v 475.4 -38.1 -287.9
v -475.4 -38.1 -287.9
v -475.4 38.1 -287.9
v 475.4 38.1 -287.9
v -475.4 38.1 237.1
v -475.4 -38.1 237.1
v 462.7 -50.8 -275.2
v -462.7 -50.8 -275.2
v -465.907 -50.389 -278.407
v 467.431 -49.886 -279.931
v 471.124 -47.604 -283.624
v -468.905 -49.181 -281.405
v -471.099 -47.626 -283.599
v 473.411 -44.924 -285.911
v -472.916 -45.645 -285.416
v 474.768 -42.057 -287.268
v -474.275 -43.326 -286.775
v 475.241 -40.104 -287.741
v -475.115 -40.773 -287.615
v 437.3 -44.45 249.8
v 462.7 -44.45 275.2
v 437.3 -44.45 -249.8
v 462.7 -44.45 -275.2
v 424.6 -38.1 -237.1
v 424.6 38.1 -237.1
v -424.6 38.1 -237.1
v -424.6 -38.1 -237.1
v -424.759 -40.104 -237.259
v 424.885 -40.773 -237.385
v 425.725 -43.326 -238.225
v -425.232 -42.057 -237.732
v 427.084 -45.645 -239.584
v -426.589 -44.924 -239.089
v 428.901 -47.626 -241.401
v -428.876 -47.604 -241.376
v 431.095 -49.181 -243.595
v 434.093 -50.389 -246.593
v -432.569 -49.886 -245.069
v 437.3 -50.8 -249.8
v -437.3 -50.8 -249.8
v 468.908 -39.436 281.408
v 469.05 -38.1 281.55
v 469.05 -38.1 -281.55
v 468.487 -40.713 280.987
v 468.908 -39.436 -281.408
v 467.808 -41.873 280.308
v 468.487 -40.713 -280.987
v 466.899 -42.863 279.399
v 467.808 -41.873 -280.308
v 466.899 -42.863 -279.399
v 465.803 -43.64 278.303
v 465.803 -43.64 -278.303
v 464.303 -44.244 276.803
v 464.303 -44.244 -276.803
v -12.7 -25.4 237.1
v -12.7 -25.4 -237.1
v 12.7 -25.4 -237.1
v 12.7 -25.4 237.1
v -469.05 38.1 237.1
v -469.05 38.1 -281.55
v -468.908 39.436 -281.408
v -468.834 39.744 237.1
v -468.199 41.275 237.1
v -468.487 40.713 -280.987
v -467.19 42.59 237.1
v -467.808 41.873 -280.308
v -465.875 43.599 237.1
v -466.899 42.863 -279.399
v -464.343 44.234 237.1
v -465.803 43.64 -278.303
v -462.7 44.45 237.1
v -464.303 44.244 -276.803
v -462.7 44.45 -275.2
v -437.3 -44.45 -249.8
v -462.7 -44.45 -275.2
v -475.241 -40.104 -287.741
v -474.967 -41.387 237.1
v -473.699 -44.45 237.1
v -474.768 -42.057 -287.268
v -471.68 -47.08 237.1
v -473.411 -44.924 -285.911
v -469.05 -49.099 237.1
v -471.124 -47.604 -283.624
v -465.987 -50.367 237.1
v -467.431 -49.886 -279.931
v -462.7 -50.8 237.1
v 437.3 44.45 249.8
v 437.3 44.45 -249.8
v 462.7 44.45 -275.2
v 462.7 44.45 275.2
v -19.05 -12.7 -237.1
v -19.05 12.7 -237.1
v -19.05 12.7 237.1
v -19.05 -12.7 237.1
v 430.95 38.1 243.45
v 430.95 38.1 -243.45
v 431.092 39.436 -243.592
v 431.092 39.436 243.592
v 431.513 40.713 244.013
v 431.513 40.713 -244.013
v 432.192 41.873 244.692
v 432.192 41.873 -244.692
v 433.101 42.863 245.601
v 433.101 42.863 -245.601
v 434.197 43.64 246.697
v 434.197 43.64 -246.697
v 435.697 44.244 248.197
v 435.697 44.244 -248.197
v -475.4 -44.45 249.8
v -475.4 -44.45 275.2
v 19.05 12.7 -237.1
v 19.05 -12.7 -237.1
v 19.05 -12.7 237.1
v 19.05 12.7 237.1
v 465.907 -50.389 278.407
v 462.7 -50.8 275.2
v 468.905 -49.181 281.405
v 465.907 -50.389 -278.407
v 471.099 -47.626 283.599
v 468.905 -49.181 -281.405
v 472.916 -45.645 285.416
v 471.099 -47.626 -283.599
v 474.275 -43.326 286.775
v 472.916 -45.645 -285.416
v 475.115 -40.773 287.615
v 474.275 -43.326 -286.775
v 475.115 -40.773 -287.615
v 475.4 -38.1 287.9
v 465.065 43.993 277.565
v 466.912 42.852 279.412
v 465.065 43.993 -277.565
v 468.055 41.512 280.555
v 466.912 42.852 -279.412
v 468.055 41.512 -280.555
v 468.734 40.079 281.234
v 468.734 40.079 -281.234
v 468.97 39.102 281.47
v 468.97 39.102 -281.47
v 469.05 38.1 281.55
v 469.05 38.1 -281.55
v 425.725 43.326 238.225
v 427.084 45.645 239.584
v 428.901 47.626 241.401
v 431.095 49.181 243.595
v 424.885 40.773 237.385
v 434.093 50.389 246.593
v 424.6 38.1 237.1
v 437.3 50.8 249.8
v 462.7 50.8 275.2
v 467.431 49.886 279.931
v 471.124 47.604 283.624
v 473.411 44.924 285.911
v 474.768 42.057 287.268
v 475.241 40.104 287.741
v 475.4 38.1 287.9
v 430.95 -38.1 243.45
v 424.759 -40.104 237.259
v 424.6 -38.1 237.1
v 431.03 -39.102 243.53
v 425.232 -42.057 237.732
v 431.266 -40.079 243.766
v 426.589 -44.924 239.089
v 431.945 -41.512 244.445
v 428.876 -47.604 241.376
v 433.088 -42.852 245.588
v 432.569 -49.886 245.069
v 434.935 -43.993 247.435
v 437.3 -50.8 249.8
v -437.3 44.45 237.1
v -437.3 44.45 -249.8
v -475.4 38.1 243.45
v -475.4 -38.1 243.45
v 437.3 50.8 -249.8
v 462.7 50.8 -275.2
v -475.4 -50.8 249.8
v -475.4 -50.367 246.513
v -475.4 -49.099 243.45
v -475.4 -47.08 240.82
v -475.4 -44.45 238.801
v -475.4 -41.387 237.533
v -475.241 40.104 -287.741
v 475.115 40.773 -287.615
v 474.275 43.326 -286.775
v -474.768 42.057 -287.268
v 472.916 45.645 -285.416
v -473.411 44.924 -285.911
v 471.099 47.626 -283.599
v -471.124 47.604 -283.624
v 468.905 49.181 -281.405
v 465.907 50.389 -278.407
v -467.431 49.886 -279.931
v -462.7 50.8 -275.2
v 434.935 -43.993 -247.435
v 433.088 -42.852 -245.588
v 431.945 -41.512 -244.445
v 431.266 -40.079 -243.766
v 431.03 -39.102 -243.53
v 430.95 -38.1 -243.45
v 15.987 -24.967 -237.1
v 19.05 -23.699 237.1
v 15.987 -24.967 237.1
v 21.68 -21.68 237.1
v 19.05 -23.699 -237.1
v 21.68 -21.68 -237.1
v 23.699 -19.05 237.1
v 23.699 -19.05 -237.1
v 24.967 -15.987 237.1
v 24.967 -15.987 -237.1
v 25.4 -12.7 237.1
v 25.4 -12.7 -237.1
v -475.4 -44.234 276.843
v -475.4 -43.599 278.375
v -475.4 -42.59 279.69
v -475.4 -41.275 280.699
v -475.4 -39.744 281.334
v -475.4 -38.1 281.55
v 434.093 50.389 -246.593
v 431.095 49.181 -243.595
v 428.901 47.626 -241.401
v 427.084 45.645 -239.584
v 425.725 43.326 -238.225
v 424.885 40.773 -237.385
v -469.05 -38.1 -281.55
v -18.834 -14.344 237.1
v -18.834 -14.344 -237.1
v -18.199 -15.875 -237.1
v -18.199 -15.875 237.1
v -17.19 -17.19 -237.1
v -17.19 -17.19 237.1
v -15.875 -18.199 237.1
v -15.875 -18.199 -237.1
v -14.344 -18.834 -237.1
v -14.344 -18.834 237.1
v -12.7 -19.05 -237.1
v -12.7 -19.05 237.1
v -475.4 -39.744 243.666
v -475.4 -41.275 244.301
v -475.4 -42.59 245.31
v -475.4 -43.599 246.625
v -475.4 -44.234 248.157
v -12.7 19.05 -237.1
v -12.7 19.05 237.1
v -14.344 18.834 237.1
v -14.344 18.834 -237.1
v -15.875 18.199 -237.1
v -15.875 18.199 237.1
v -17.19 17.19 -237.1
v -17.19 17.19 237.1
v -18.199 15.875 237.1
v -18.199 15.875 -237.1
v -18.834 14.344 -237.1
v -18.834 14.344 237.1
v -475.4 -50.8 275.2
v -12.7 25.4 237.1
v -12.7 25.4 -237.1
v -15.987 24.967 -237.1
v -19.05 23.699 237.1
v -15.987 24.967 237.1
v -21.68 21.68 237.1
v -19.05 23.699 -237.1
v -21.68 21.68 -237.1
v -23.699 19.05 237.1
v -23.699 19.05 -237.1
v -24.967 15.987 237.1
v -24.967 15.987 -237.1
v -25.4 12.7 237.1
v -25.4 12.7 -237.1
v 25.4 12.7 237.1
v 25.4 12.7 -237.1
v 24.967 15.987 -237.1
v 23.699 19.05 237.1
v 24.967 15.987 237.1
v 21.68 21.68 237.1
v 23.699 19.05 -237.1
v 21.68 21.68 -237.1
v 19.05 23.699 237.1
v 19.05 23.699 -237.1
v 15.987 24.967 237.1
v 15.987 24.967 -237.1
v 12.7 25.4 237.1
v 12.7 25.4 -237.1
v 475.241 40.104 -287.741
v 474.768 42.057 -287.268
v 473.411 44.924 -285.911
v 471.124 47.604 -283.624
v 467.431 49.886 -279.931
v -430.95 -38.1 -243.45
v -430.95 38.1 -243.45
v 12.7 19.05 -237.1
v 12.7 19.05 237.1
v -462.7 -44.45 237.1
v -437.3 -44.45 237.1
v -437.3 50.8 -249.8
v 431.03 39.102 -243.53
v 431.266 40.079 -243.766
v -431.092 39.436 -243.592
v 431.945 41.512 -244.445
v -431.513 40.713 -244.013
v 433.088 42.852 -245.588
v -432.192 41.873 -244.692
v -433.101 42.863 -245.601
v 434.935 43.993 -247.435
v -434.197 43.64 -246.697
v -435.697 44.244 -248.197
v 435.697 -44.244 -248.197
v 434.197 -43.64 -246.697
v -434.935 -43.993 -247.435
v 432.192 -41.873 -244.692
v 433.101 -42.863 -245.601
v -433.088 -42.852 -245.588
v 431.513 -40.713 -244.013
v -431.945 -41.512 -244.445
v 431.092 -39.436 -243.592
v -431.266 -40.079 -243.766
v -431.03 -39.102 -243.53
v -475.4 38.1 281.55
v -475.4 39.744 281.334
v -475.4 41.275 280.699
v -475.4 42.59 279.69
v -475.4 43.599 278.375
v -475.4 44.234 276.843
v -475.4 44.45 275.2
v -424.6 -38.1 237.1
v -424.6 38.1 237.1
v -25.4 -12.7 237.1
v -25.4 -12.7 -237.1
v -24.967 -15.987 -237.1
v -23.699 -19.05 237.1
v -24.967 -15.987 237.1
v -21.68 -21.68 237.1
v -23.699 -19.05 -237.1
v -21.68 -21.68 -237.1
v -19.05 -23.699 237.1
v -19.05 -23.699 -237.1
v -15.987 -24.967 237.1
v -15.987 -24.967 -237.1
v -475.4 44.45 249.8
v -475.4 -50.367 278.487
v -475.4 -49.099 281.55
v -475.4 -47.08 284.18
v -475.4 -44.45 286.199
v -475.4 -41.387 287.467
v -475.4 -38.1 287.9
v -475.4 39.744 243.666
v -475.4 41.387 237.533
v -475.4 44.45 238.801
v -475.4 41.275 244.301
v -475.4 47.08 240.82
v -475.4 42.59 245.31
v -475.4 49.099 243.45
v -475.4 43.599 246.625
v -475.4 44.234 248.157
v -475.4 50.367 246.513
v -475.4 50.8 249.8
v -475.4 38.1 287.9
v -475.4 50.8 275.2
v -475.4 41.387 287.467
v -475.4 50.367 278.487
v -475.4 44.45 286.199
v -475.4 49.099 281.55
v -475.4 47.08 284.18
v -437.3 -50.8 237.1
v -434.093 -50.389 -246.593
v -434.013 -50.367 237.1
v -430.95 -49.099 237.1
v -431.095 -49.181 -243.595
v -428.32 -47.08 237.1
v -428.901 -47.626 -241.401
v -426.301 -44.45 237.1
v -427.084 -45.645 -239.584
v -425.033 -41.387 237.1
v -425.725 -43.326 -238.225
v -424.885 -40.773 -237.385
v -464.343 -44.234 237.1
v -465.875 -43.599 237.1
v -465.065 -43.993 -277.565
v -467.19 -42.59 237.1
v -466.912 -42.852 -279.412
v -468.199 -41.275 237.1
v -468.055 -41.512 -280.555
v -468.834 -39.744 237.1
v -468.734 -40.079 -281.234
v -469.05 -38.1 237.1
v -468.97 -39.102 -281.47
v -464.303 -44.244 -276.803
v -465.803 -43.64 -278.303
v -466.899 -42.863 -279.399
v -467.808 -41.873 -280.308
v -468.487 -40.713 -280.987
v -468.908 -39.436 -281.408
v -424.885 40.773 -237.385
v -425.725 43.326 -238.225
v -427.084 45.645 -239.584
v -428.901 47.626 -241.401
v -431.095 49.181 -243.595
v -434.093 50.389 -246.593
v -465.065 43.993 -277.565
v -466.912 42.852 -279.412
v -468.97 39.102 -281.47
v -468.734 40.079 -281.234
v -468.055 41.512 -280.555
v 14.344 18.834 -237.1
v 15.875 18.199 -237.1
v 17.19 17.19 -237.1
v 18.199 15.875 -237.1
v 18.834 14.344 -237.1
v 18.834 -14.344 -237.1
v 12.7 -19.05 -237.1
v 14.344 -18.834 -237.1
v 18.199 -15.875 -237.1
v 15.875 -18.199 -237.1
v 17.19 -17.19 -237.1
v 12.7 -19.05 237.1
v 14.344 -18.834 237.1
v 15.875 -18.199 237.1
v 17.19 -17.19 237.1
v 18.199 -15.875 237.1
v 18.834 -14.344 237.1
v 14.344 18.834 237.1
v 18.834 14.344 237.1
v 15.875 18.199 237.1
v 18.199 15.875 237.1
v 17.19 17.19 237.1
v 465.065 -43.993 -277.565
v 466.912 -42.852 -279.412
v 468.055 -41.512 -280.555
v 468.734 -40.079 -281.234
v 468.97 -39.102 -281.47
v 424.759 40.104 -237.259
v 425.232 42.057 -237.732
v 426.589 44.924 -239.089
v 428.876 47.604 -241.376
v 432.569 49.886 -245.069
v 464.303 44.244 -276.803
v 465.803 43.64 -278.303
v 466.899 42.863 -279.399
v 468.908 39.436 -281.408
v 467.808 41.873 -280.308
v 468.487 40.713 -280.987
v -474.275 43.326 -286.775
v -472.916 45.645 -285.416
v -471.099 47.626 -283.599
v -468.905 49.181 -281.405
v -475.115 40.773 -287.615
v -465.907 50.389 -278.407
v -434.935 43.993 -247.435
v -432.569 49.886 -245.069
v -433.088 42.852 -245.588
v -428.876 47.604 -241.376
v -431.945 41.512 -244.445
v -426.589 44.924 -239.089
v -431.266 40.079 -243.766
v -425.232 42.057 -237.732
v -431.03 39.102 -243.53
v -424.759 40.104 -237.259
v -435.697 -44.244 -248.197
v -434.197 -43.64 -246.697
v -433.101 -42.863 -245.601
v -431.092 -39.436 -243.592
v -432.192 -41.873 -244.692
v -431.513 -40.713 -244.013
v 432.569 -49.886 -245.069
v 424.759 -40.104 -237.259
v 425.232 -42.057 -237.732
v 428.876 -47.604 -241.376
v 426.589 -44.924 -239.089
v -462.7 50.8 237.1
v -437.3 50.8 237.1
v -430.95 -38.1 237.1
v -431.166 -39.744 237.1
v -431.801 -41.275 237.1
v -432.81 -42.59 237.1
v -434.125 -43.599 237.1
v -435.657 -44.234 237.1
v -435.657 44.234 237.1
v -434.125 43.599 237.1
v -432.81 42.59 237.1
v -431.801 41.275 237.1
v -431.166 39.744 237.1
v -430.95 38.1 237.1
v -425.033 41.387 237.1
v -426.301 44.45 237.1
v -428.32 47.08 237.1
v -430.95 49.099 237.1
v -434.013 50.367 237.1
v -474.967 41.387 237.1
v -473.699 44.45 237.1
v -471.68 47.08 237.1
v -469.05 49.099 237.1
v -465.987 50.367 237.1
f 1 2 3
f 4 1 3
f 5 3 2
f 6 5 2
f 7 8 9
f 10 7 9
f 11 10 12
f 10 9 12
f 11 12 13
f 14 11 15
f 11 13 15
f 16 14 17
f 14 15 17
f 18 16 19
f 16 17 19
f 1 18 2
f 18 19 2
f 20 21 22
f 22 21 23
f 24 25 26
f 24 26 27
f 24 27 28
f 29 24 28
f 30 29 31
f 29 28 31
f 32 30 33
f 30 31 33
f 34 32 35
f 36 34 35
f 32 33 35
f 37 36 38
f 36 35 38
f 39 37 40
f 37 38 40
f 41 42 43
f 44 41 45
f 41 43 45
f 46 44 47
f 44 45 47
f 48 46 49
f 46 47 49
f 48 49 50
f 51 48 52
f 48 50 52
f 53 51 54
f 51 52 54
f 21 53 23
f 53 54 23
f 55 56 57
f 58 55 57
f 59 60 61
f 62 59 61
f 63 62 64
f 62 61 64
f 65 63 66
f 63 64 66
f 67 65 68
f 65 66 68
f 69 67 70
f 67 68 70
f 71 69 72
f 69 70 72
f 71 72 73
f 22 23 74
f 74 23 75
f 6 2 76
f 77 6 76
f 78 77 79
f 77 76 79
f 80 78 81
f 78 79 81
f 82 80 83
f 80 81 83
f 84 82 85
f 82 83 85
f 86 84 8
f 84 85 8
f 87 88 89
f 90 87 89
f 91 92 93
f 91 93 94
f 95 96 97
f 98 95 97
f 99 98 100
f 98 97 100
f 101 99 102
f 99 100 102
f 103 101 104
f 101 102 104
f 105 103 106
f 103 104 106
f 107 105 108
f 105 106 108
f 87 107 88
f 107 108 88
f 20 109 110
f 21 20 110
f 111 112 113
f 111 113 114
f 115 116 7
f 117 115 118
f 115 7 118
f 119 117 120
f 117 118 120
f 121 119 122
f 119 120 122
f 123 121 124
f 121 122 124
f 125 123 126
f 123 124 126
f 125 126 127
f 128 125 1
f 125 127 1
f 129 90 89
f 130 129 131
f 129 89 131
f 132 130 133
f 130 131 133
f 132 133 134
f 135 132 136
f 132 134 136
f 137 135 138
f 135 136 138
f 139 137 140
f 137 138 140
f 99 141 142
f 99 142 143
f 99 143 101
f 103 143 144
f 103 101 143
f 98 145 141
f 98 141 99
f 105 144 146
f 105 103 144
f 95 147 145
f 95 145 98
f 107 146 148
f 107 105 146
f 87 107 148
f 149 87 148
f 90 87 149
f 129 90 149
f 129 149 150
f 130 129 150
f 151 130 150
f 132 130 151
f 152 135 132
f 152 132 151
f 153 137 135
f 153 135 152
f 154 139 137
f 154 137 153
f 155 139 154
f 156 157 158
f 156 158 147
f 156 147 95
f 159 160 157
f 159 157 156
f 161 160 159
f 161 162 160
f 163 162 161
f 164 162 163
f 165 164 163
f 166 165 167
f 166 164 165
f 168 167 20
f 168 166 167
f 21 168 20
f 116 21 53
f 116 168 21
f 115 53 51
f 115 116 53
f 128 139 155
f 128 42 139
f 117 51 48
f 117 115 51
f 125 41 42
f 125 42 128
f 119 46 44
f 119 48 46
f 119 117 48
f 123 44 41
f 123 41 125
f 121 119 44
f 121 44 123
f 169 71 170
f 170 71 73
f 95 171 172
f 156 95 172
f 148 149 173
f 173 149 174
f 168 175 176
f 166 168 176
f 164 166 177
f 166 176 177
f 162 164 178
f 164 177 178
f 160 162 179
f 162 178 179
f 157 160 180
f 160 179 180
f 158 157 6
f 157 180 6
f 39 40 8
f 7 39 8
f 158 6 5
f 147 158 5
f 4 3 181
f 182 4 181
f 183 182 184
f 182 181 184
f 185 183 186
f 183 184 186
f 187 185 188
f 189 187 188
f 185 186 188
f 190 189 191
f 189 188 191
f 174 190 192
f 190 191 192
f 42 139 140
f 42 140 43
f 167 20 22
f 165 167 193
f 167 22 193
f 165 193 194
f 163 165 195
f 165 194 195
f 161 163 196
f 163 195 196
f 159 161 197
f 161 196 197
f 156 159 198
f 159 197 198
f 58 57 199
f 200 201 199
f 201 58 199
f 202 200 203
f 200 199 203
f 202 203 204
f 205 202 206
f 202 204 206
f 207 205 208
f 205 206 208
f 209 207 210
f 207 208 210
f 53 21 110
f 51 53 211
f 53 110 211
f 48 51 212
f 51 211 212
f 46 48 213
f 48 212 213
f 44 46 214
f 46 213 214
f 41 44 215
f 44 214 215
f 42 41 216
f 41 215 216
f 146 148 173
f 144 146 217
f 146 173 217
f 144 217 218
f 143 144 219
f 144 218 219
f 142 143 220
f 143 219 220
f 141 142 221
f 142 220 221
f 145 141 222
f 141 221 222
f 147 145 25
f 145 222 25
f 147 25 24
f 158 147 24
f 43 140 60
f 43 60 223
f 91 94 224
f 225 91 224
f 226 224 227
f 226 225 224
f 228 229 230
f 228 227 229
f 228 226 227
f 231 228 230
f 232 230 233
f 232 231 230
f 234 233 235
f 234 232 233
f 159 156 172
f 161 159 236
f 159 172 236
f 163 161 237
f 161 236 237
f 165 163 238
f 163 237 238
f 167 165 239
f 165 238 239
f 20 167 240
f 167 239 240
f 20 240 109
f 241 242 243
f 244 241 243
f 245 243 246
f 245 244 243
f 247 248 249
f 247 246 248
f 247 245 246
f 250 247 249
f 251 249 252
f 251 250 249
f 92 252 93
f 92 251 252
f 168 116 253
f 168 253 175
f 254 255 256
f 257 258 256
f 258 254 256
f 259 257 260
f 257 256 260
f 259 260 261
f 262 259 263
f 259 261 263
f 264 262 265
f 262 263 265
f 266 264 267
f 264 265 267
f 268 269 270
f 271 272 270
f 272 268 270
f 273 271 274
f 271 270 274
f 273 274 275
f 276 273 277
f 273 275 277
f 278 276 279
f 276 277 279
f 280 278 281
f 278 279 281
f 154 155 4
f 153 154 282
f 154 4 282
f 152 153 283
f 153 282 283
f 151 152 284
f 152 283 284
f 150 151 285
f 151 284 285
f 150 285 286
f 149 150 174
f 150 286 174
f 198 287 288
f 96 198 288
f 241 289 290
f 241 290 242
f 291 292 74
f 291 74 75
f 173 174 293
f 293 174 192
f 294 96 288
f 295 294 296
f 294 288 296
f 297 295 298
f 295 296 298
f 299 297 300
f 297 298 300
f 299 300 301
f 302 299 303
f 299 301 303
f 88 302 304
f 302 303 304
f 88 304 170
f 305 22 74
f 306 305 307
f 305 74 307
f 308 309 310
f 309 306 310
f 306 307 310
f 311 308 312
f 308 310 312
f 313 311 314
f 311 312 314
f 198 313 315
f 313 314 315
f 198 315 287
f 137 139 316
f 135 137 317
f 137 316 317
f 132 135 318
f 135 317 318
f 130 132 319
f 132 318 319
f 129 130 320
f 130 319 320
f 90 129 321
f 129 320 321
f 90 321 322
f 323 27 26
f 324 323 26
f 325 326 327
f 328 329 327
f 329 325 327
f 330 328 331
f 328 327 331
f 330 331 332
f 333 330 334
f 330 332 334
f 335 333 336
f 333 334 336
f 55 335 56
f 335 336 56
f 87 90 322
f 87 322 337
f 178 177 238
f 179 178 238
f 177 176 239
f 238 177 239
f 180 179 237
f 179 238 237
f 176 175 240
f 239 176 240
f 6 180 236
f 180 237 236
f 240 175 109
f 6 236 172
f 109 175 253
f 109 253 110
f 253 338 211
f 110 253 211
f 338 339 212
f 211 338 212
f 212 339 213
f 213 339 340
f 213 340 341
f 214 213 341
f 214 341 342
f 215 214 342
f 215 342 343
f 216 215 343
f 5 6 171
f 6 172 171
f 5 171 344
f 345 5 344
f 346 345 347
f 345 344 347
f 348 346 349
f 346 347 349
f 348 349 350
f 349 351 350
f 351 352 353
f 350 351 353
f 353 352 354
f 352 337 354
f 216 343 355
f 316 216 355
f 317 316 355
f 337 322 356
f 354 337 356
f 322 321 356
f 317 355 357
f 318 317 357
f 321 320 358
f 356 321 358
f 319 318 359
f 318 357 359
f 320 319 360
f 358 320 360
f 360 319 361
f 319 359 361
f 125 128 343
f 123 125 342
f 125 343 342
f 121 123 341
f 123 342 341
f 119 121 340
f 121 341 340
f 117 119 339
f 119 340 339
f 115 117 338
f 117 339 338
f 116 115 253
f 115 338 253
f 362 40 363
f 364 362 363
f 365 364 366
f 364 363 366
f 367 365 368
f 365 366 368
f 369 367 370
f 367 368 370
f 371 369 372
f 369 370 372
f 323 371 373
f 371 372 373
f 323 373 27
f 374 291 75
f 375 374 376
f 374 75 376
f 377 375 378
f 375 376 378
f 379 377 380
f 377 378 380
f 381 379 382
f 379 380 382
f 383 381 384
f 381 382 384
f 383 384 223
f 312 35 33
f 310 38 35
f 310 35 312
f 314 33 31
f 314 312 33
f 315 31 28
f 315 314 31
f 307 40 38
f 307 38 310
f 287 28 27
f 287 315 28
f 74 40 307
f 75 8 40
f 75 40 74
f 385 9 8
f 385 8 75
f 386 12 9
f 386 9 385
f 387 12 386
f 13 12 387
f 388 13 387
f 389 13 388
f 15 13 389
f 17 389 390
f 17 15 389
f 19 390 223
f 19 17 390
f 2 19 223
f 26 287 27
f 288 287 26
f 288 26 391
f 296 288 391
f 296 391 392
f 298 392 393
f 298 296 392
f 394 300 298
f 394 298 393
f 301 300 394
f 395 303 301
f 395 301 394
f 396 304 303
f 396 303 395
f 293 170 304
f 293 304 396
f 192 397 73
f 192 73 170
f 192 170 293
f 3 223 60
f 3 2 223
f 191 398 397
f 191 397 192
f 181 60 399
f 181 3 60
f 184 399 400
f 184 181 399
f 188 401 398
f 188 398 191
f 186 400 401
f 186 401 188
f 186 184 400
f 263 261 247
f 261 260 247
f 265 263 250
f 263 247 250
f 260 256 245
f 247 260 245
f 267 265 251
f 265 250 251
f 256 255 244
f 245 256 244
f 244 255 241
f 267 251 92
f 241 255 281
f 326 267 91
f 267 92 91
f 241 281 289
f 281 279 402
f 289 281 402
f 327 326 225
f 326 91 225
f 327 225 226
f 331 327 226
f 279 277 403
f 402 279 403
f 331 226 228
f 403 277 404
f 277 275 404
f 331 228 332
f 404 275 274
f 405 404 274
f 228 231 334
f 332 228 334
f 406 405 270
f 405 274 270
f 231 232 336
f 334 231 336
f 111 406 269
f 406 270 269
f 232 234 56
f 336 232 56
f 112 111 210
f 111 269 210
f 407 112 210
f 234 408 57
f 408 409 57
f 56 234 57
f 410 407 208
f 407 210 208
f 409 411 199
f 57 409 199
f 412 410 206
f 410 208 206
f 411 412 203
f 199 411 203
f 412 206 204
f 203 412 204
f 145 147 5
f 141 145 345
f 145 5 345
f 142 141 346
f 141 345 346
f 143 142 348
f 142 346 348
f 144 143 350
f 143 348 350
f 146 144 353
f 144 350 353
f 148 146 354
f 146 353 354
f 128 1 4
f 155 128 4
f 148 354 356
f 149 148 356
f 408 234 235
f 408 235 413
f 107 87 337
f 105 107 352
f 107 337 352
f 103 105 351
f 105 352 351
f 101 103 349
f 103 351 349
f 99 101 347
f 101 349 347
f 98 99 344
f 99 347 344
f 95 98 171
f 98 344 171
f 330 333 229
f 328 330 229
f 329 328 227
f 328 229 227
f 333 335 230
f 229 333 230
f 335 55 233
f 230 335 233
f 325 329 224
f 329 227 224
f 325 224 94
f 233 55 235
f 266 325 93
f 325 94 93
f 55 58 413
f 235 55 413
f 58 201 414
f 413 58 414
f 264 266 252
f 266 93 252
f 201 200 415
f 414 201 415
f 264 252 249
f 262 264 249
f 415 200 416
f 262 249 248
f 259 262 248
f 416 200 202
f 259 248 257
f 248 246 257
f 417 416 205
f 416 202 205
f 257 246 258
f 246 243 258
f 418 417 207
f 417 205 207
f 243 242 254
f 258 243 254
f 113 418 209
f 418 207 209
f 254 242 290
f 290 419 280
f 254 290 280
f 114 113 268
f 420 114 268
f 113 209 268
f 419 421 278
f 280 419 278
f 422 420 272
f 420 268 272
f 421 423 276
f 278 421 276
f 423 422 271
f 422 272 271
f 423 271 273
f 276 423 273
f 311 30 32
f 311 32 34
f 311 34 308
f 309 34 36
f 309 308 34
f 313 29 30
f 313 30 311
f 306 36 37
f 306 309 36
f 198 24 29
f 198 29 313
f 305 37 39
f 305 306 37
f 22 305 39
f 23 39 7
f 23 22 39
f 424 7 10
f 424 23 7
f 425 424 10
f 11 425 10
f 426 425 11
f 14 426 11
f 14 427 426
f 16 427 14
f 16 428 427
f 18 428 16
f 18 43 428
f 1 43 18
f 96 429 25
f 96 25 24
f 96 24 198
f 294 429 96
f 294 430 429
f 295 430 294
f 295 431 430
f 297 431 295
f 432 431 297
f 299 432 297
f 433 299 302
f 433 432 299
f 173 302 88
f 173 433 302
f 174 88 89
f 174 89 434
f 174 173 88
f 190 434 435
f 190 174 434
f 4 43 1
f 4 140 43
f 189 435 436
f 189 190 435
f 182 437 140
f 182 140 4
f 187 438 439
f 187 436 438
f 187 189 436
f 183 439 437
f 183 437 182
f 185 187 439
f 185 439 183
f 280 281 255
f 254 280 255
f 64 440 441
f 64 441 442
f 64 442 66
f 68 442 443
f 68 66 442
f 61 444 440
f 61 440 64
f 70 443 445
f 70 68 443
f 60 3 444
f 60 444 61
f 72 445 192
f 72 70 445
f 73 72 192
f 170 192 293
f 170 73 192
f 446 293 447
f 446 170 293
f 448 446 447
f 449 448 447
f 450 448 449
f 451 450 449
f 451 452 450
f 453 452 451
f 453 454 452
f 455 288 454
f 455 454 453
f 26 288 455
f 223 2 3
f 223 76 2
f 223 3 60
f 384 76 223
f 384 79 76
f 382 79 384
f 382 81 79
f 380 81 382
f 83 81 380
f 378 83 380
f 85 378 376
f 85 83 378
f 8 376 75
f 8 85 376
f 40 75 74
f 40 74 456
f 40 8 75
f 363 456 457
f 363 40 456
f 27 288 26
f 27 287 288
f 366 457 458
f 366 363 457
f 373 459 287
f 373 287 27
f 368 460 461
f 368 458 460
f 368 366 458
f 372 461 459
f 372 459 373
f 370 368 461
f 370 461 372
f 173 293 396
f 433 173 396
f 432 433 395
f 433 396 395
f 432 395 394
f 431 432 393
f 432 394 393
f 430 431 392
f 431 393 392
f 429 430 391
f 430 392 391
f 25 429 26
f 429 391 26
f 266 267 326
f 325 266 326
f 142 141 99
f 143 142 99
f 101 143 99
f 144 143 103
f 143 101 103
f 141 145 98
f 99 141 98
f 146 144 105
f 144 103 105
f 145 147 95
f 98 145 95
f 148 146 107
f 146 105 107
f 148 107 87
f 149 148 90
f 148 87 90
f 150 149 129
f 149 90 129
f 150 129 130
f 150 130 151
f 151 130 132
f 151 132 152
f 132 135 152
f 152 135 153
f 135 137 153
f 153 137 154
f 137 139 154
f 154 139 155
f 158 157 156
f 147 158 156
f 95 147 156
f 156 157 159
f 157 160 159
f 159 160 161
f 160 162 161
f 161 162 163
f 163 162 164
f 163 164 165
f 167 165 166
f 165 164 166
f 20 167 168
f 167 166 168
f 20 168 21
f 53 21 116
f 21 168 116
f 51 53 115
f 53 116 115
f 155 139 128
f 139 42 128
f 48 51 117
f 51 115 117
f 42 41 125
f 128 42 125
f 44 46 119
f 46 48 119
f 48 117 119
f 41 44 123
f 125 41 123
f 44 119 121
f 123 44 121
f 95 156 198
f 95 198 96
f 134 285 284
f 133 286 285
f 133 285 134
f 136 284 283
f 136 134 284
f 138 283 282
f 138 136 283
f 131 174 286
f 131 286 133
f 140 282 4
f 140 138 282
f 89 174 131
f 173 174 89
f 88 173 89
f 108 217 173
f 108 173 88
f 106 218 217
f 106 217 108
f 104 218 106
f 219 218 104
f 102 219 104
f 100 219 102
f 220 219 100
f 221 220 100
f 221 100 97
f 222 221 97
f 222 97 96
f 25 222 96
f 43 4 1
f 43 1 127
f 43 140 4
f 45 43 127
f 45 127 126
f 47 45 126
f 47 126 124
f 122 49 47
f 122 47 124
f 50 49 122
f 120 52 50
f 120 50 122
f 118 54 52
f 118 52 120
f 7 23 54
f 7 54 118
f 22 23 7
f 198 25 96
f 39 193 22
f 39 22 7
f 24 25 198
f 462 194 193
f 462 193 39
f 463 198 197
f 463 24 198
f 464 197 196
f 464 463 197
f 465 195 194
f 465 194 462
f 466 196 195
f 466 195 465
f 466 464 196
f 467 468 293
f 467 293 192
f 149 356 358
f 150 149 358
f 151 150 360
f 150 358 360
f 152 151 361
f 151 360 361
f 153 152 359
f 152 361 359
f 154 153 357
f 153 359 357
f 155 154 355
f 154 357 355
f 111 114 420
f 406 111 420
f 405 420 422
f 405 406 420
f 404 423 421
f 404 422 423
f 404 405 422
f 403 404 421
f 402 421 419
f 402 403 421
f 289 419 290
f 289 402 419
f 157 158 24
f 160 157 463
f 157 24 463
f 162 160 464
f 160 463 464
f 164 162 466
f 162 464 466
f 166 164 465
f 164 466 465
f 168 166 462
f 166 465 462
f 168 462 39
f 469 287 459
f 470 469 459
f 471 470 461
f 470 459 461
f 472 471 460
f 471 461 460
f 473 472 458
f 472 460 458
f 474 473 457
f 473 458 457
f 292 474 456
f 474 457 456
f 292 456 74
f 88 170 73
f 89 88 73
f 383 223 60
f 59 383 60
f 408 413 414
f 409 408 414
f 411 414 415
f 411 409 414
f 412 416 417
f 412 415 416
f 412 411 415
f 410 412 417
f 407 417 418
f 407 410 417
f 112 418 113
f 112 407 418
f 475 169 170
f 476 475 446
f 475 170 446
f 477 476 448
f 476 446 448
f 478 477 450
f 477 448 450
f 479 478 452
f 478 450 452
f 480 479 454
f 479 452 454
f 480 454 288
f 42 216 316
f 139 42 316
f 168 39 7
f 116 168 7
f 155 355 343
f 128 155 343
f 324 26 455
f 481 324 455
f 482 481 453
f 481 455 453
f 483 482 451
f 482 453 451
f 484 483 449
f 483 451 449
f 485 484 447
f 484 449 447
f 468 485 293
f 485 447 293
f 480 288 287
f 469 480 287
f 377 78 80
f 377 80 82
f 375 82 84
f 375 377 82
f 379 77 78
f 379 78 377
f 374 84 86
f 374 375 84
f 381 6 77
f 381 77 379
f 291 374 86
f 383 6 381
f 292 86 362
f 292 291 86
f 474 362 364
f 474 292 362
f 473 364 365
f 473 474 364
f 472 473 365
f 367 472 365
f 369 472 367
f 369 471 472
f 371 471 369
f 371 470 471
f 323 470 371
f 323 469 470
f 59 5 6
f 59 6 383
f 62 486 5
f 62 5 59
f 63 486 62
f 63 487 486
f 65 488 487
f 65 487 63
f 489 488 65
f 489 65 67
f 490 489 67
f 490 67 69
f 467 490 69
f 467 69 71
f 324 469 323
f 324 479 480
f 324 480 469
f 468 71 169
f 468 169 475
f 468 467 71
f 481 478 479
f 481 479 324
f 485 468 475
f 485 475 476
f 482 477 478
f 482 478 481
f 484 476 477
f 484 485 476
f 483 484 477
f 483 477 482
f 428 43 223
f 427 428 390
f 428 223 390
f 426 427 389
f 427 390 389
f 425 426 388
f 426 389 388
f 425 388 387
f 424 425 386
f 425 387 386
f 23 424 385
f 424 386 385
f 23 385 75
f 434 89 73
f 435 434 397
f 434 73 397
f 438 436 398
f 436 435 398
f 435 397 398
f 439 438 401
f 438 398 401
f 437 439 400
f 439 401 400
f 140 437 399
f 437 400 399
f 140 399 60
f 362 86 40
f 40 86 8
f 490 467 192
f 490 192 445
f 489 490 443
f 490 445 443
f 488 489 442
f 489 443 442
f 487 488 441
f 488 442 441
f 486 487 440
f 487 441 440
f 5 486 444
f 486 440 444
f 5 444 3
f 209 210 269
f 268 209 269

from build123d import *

# Parameters (mm, degrees)
RECTANGULAR_START                          = -287.899978029
RECTANGULAR_TUBE_4_X_2_X_0_25_1_DEPTH      = 525
RECTANGULAR_START_2                        = -132.582521472
RECTANGULAR_TUBE_4_X_2_X_0_25_1_2_OUTLIN_W = 75
RECTANGULAR_TUBE_4_X_2_X_0_25_1_2_OUTLIN_H = 104
RECTANGULAR_TUBE_4_X_2_X_0_25_1_2_DEPTH    = 36.582521472
RECTANGULAR_START_3                        = -475.399978029
RECTANGULAR_TUBE_4_X_2_X_0_25_1_3_DEPTH    = 950.799956058
RECTANGULAR_START_4                        = 132.582521472
RECTANGULAR_TUBE_4_X_2_X_0_25_1_4_OUTLIN_W = 75
RECTANGULAR_TUBE_4_X_2_X_0_25_1_4_OUTLIN_H = 104
RECTANGULAR_TUBE_4_X_2_X_0_25_1_4_DEPTH    = 37.417478528
RECTANGULAR_TUBE_4_X_2_X_0_25_1_5_DEPTH    = 950.799956058
RECTANGULAR_TUBE_4_X_2_X_0_25_1_6_OUTLIN_W = 673.582521472
RECTANGULAR_TUBE_4_X_2_X_0_25_1_6_OUTLIN_H = 104
RECTANGULAR_TUBE_4_X_2_X_0_25_1_6_DEPTH    = 37.417478528
RECTANGULAR_START_5                        = -541
RECTANGULAR_TUBE_4_X_2_X_0_25_1_7_OUTLIN_W = 37.417478528
RECTANGULAR_TUBE_4_X_2_X_0_25_1_7_OUTLIN_H = 104
RECTANGULAR_TUBE_4_X_2_X_0_25_1_7_DEPTH    = 673.582521472
RECTANGULAR_TUBE_4_X_2_X_0_25_1_8_DEPTH    = 575.799956058
RECTANGULAR_START_6                        = 96
RECTANGULAR_TUBE_4_X_2_X_0_25_1_9_OUTLIN_W = 408.417478528
RECTANGULAR_TUBE_4_X_2_X_0_25_1_9_OUTLIN_H = 104
RECTANGULAR_TUBE_4_X_2_X_0_25_1_9_DEPTH    = 36.582521472
RECTANGULAR_TUBE_4_X_2_X_0_25_1_10_OUTLI_W = 37.582521472
RECTANGULAR_TUBE_4_X_2_X_0_25_1_10_OUTLI_H = 104
RECTANGULAR_TUBE_4_X_2_X_0_25_1_10_DEPTH   = 408.417478528
SQUARE_TUBE_2_X_2_X_0_25_1_DEPTH           = 525


with BuildPart() as part:
    # Rectangular tube 4 X 2 X 0.25(1): read off the stored shape, not the designer's step
    # Rectangular tube 4 X 2 X 0.25(1) outline → Rectangular tube 4 X 2 X 0.25(1) (new body)
    with BuildSketch(Plane.XY.offset(RECTANGULAR_START)):
        with BuildLine():
            Line((-475.399978029, 38.1), (-475.399978029, -38.1))
            ThreePointArc((-475.399978029, -38.1), (-471.68023415, -47.080256121), (-462.699978029, -50.8))
            Line((-462.699978029, -50.8), (-437.300021971, -50.8))
            ThreePointArc((-437.300021971, -50.8), (-428.31976585, -47.080256121), (-424.600021971, -38.1))
            Line((-424.600021971, -38.1), (-424.600021971, 38.1))
            ThreePointArc((-424.600021971, 38.1), (-428.31976585, 47.080256121), (-437.300021971, 50.8))
            Line((-437.300021971, 50.8), (-462.699978029, 50.8))
            ThreePointArc((-462.699978029, 50.8), (-471.68023415, 47.080256121), (-475.399978029, 38.1))
        make_face()
        with BuildLine():
            ThreePointArc((-437.300021971, 44.45), (-432.80989391, 42.590128061), (-430.950021971, 38.1))
            Line((-430.950021971, 38.1), (-430.950021971, -38.1))
            ThreePointArc((-430.950021971, -38.1), (-432.80989391, -42.590128061), (-437.300021971, -44.45))
            Line((-437.300021971, -44.45), (-462.699978029, -44.45))
            ThreePointArc((-462.699978029, -44.45), (-467.19010609, -42.590128061), (-469.049978029, -38.1))
            Line((-469.049978029, -38.1), (-469.049978029, 38.1))
            ThreePointArc((-469.049978029, 38.1), (-467.19010609, 42.590128061), (-462.699978029, 44.45))
            Line((-462.699978029, 44.45), (-437.300021971, 44.45))
        make_face(mode=Mode.SUBTRACT)
    extrude(amount=RECTANGULAR_TUBE_4_X_2_X_0_25_1_DEPTH)

    # Rectangular tube 4 X 2 X 0.25_1 2 outlin → Rectangular tube 4 X 2 X 0.25_1 2 (cut)
    with BuildSketch(Plane(origin=(0, 0, 0), x_dir=(0.707106781186548, 0, 0.707106781186547), z_dir=(0.707106781186547, 0, -0.707106781186548)).offset(RECTANGULAR_START_2)):
        with Locations((-503.5, 0)):
            Rectangle(RECTANGULAR_TUBE_4_X_2_X_0_25_1_2_OUTLIN_W, RECTANGULAR_TUBE_4_X_2_X_0_25_1_2_OUTLIN_H)
    extrude(amount=RECTANGULAR_TUBE_4_X_2_X_0_25_1_2_DEPTH, mode=Mode.SUBTRACT)


with BuildPart() as body_2:
    # Rectangular tube 4 X 2 X 0.25_1 3 outlin → Rectangular tube 4 X 2 X 0.25_1 3 (new body)
    with BuildSketch(Plane.YZ.offset(RECTANGULAR_START_3)):
        with BuildLine():
            Line((50.8, 249.800021971), (50.8, 275.199978029))
            ThreePointArc((50.8, 275.199978029), (47.080256121, 284.18023415), (38.1, 287.899978029))
            Line((38.1, 287.899978029), (-38.1, 287.899978029))
            ThreePointArc((-38.1, 287.899978029), (-47.080256121, 284.18023415), (-50.8, 275.199978029))
            Line((-50.8, 275.199978029), (-50.8, 249.800021971))
            ThreePointArc((-50.8, 249.800021971), (-47.080256121, 240.81976585), (-38.1, 237.100021971))
            Line((-38.1, 237.100021971), (38.1, 237.100021971))
            ThreePointArc((38.1, 237.100021971), (47.080256121, 240.81976585), (50.8, 249.800021971))
        make_face()
        with BuildLine():
            ThreePointArc((44.45, 249.800021971), (42.590128061, 245.30989391), (38.1, 243.450021971))
            Line((38.1, 243.450021971), (-38.1, 243.450021971))
            ThreePointArc((-38.1, 243.450021971), (-42.590128061, 245.30989391), (-44.45, 249.800021971))
            Line((-44.45, 249.800021971), (-44.45, 275.199978029))
            ThreePointArc((-44.45, 275.199978029), (-42.590128061, 279.69010609), (-38.1, 281.549978029))
            Line((-38.1, 281.549978029), (38.1, 281.549978029))
            ThreePointArc((38.1, 281.549978029), (42.590128061, 279.69010609), (44.45, 275.199978029))
            Line((44.45, 275.199978029), (44.45, 249.800021971))
        make_face(mode=Mode.SUBTRACT)
    extrude(amount=RECTANGULAR_TUBE_4_X_2_X_0_25_1_3_DEPTH)

    # Rectangular tube 4 X 2 X 0.25_1 4 outlin → Rectangular tube 4 X 2 X 0.25_1 4 (cut)
    with BuildSketch(Plane(origin=(0, 0, 0), x_dir=(0.707106781186548, 0, 0.707106781186547), z_dir=(0.707106781186547, 0, -0.707106781186548)).offset(RECTANGULAR_START_4)):
        with Locations((503.5, 0)):
            Rectangle(RECTANGULAR_TUBE_4_X_2_X_0_25_1_4_OUTLIN_W, RECTANGULAR_TUBE_4_X_2_X_0_25_1_4_OUTLIN_H)
    extrude(amount=RECTANGULAR_TUBE_4_X_2_X_0_25_1_4_DEPTH, mode=Mode.SUBTRACT)


with BuildPart() as body_3:
    # Rectangular tube 4 X 2 X 0.25_1 5 outlin → Rectangular tube 4 X 2 X 0.25_1 5 (new body)
    with BuildSketch(Plane.YZ.offset(RECTANGULAR_START_3)):
        with BuildLine():
            ThreePointArc((38.1, -287.899978029), (47.080256121, -284.18023415), (50.8, -275.199978029))
            Line((50.8, -275.199978029), (50.8, -249.800021971))
            ThreePointArc((50.8, -249.800021971), (47.080256121, -240.81976585), (38.1, -237.100021971))
            Line((38.1, -237.100021971), (-38.1, -237.100021971))
            ThreePointArc((-38.1, -237.100021971), (-47.080256121, -240.81976585), (-50.8, -249.800021971))
            Line((-50.8, -249.800021971), (-50.8, -275.199978029))
            ThreePointArc((-50.8, -275.199978029), (-47.080256121, -284.18023415), (-38.1, -287.899978029))
            Line((-38.1, -287.899978029), (38.1, -287.899978029))
        make_face()
        with BuildLine():
            Line((-38.1, -243.450021971), (38.1, -243.450021971))
            ThreePointArc((38.1, -243.450021971), (42.590128061, -245.30989391), (44.45, -249.800021971))
            Line((44.45, -249.800021971), (44.45, -275.199978029))
            ThreePointArc((44.45, -275.199978029), (42.590128061, -279.69010609), (38.1, -281.549978029))
            Line((38.1, -281.549978029), (-38.1, -281.549978029))
            ThreePointArc((-38.1, -281.549978029), (-42.590128061, -279.69010609), (-44.45, -275.199978029))
            Line((-44.45, -275.199978029), (-44.45, -249.800021971))
            ThreePointArc((-44.45, -249.800021971), (-42.590128061, -245.30989391), (-38.1, -243.450021971))
        make_face(mode=Mode.SUBTRACT)
    extrude(amount=RECTANGULAR_TUBE_4_X_2_X_0_25_1_5_DEPTH)

    # Rectangular tube 4 X 2 X 0.25_1 6 outlin → Rectangular tube 4 X 2 X 0.25_1 6 (cut)
    with BuildSketch(Plane(origin=(0, 0, 0), x_dir=(0.7071067811865471, 0, -0.707106781186548), z_dir=(0.707106781186548, 0, 0.707106781186547)).offset(RECTANGULAR_START_4)):
        with Locations((204.208739264, 0)):
            Rectangle(RECTANGULAR_TUBE_4_X_2_X_0_25_1_6_OUTLIN_W, RECTANGULAR_TUBE_4_X_2_X_0_25_1_6_OUTLIN_H)
    extrude(amount=RECTANGULAR_TUBE_4_X_2_X_0_25_1_6_DEPTH, mode=Mode.SUBTRACT)

    # Rectangular tube 4 X 2 X 0.25_1 7 outlin → Rectangular tube 4 X 2 X 0.25_1 7 (cut)
    with BuildSketch(Plane(origin=(0, 0, 0), x_dir=(0.7071067811865471, 0, -0.707106781186548), z_dir=(0.707106781186548, 0, 0.707106781186547)).offset(RECTANGULAR_START_5)):
        with Locations((-151.291260736, 0)):
            Rectangle(RECTANGULAR_TUBE_4_X_2_X_0_25_1_7_OUTLIN_W, RECTANGULAR_TUBE_4_X_2_X_0_25_1_7_OUTLIN_H)
    extrude(amount=RECTANGULAR_TUBE_4_X_2_X_0_25_1_7_DEPTH, mode=Mode.SUBTRACT)


with BuildPart() as body_4:
    # Rectangular tube 4 X 2 X 0.25_1 8 outlin → Rectangular tube 4 X 2 X 0.25_1 8 (new body)
    with BuildSketch(Plane.XY.offset(RECTANGULAR_START)):
        with BuildLine():
            ThreePointArc((475.399978029, 38.1), (471.68023415, 47.080256121), (462.699978029, 50.8))
            Line((462.699978029, 50.8), (437.300021971, 50.8))
            ThreePointArc((437.300021971, 50.8), (428.31976585, 47.080256121), (424.600021971, 38.1))
            Line((424.600021971, 38.1), (424.600021971, -38.1))
            ThreePointArc((424.600021971, -38.1), (428.31976585, -47.080256121), (437.300021971, -50.8))
            Line((437.300021971, -50.8), (462.699978029, -50.8))
            ThreePointArc((462.699978029, -50.8), (471.68023415, -47.080256121), (475.399978029, -38.1))
            Line((475.399978029, -38.1), (475.399978029, 38.1))
        make_face()
        with BuildLine():
            Line((430.950021971, -38.1), (430.950021971, 38.1))
            ThreePointArc((430.950021971, 38.1), (432.80989391, 42.590128061), (437.300021971, 44.45))
            Line((437.300021971, 44.45), (462.699978029, 44.45))
            ThreePointArc((462.699978029, 44.45), (467.19010609, 42.590128061), (469.049978029, 38.1))
            Line((469.049978029, 38.1), (469.049978029, -38.1))
            ThreePointArc((469.049978029, -38.1), (467.19010609, -42.590128061), (462.699978029, -44.45))
            Line((462.699978029, -44.45), (437.300021971, -44.45))
            ThreePointArc((437.300021971, -44.45), (432.80989391, -42.590128061), (430.950021971, -38.1))
        make_face(mode=Mode.SUBTRACT)
    extrude(amount=RECTANGULAR_TUBE_4_X_2_X_0_25_1_8_DEPTH)

    # Rectangular tube 4 X 2 X 0.25_1 9 outlin → Rectangular tube 4 X 2 X 0.25_1 9 (cut)
    with BuildSketch(Plane(origin=(0, 0, 0), x_dir=(0.707106781186548, 0, 0.707106781186547), z_dir=(0.707106781186547, 0, -0.707106781186548)).offset(RECTANGULAR_START_6)):
        with Locations((336.791260736, 0)):
            Rectangle(RECTANGULAR_TUBE_4_X_2_X_0_25_1_9_OUTLIN_W, RECTANGULAR_TUBE_4_X_2_X_0_25_1_9_OUTLIN_H)
    extrude(amount=RECTANGULAR_TUBE_4_X_2_X_0_25_1_9_DEPTH, mode=Mode.SUBTRACT)

    # Rectangular tube 4 X 2 X 0.25_1 10 outli → Rectangular tube 4 X 2 X 0.25_1 10 (cut)
    with BuildSketch(Plane(origin=(0, 0, 0), x_dir=(0.707106781186548, 0, 0.707106781186547), z_dir=(0.707106781186547, 0, -0.707106781186548)).offset(RECTANGULAR_START_4)):
        with Locations((113.791260736, 0)):
            Rectangle(RECTANGULAR_TUBE_4_X_2_X_0_25_1_10_OUTLI_W, RECTANGULAR_TUBE_4_X_2_X_0_25_1_10_OUTLI_H)
    extrude(amount=RECTANGULAR_TUBE_4_X_2_X_0_25_1_10_DEPTH, mode=Mode.SUBTRACT)


with BuildPart() as body_5:
    # Sketch12 → Square tube 2 X 2 X 0.25(1) (new body)
    with BuildSketch(Plane.XY.offset(-262.5)):
        with BuildLine():
            Line((-12.7, -25.4), (12.7, -25.4))
            ThreePointArc((12.7, -25.4), (21.680256121, -21.680256121), (25.4, -12.7))
            Line((25.4, -12.7), (25.4, 12.7))
            ThreePointArc((25.4, 12.7), (21.680256121, 21.680256121), (12.7, 25.4))
            Line((12.7, 25.4), (-12.7, 25.4))
            ThreePointArc((-12.7, 25.4), (-21.680256121, 21.680256121), (-25.4, 12.7))
            Line((-25.4, 12.7), (-25.4, -12.7))
            ThreePointArc((-25.4, -12.7), (-21.680256121, -21.680256121), (-12.7, -25.4))
        make_face()
        with BuildLine():
            Line((-12.7, -19.05), (12.7, -19.05))
            ThreePointArc((12.7, -19.05), (17.190128061, -17.190128061), (19.05, -12.7))
            Line((19.05, -12.7), (19.05, 12.7))
            ThreePointArc((19.05, 12.7), (17.190128061, 17.190128061), (12.7, 19.05))
            Line((12.7, 19.05), (-12.7, 19.05))
            ThreePointArc((-12.7, 19.05), (-17.190128061, 17.190128061), (-19.05, 12.7))
            Line((-19.05, 12.7), (-19.05, -12.7))
            ThreePointArc((-19.05, -12.7), (-17.190128061, -17.190128061), (-12.7, -19.05))
        make_face(mode=Mode.SUBTRACT)
    extrude(amount=SQUARE_TUBE_2_X_2_X_0_25_1_DEPTH)

    # Trim/Extend1
    split(bisect_by=Plane(origin=(-25.399978029, 0, 237.100021971), x_dir=(0, 1, 0), z_dir=(0, 0, -1)), keep=Keep.TOP)

    # Trim_Extend1 3
    split(bisect_by=Plane(origin=(0, 0, -237.100021971), x_dir=(0, -1, 0), z_dir=(0, 0, 1)), keep=Keep.TOP)


solid = Compound([part.part, body_2.part, body_3.part, body_4.part, body_5.part])
